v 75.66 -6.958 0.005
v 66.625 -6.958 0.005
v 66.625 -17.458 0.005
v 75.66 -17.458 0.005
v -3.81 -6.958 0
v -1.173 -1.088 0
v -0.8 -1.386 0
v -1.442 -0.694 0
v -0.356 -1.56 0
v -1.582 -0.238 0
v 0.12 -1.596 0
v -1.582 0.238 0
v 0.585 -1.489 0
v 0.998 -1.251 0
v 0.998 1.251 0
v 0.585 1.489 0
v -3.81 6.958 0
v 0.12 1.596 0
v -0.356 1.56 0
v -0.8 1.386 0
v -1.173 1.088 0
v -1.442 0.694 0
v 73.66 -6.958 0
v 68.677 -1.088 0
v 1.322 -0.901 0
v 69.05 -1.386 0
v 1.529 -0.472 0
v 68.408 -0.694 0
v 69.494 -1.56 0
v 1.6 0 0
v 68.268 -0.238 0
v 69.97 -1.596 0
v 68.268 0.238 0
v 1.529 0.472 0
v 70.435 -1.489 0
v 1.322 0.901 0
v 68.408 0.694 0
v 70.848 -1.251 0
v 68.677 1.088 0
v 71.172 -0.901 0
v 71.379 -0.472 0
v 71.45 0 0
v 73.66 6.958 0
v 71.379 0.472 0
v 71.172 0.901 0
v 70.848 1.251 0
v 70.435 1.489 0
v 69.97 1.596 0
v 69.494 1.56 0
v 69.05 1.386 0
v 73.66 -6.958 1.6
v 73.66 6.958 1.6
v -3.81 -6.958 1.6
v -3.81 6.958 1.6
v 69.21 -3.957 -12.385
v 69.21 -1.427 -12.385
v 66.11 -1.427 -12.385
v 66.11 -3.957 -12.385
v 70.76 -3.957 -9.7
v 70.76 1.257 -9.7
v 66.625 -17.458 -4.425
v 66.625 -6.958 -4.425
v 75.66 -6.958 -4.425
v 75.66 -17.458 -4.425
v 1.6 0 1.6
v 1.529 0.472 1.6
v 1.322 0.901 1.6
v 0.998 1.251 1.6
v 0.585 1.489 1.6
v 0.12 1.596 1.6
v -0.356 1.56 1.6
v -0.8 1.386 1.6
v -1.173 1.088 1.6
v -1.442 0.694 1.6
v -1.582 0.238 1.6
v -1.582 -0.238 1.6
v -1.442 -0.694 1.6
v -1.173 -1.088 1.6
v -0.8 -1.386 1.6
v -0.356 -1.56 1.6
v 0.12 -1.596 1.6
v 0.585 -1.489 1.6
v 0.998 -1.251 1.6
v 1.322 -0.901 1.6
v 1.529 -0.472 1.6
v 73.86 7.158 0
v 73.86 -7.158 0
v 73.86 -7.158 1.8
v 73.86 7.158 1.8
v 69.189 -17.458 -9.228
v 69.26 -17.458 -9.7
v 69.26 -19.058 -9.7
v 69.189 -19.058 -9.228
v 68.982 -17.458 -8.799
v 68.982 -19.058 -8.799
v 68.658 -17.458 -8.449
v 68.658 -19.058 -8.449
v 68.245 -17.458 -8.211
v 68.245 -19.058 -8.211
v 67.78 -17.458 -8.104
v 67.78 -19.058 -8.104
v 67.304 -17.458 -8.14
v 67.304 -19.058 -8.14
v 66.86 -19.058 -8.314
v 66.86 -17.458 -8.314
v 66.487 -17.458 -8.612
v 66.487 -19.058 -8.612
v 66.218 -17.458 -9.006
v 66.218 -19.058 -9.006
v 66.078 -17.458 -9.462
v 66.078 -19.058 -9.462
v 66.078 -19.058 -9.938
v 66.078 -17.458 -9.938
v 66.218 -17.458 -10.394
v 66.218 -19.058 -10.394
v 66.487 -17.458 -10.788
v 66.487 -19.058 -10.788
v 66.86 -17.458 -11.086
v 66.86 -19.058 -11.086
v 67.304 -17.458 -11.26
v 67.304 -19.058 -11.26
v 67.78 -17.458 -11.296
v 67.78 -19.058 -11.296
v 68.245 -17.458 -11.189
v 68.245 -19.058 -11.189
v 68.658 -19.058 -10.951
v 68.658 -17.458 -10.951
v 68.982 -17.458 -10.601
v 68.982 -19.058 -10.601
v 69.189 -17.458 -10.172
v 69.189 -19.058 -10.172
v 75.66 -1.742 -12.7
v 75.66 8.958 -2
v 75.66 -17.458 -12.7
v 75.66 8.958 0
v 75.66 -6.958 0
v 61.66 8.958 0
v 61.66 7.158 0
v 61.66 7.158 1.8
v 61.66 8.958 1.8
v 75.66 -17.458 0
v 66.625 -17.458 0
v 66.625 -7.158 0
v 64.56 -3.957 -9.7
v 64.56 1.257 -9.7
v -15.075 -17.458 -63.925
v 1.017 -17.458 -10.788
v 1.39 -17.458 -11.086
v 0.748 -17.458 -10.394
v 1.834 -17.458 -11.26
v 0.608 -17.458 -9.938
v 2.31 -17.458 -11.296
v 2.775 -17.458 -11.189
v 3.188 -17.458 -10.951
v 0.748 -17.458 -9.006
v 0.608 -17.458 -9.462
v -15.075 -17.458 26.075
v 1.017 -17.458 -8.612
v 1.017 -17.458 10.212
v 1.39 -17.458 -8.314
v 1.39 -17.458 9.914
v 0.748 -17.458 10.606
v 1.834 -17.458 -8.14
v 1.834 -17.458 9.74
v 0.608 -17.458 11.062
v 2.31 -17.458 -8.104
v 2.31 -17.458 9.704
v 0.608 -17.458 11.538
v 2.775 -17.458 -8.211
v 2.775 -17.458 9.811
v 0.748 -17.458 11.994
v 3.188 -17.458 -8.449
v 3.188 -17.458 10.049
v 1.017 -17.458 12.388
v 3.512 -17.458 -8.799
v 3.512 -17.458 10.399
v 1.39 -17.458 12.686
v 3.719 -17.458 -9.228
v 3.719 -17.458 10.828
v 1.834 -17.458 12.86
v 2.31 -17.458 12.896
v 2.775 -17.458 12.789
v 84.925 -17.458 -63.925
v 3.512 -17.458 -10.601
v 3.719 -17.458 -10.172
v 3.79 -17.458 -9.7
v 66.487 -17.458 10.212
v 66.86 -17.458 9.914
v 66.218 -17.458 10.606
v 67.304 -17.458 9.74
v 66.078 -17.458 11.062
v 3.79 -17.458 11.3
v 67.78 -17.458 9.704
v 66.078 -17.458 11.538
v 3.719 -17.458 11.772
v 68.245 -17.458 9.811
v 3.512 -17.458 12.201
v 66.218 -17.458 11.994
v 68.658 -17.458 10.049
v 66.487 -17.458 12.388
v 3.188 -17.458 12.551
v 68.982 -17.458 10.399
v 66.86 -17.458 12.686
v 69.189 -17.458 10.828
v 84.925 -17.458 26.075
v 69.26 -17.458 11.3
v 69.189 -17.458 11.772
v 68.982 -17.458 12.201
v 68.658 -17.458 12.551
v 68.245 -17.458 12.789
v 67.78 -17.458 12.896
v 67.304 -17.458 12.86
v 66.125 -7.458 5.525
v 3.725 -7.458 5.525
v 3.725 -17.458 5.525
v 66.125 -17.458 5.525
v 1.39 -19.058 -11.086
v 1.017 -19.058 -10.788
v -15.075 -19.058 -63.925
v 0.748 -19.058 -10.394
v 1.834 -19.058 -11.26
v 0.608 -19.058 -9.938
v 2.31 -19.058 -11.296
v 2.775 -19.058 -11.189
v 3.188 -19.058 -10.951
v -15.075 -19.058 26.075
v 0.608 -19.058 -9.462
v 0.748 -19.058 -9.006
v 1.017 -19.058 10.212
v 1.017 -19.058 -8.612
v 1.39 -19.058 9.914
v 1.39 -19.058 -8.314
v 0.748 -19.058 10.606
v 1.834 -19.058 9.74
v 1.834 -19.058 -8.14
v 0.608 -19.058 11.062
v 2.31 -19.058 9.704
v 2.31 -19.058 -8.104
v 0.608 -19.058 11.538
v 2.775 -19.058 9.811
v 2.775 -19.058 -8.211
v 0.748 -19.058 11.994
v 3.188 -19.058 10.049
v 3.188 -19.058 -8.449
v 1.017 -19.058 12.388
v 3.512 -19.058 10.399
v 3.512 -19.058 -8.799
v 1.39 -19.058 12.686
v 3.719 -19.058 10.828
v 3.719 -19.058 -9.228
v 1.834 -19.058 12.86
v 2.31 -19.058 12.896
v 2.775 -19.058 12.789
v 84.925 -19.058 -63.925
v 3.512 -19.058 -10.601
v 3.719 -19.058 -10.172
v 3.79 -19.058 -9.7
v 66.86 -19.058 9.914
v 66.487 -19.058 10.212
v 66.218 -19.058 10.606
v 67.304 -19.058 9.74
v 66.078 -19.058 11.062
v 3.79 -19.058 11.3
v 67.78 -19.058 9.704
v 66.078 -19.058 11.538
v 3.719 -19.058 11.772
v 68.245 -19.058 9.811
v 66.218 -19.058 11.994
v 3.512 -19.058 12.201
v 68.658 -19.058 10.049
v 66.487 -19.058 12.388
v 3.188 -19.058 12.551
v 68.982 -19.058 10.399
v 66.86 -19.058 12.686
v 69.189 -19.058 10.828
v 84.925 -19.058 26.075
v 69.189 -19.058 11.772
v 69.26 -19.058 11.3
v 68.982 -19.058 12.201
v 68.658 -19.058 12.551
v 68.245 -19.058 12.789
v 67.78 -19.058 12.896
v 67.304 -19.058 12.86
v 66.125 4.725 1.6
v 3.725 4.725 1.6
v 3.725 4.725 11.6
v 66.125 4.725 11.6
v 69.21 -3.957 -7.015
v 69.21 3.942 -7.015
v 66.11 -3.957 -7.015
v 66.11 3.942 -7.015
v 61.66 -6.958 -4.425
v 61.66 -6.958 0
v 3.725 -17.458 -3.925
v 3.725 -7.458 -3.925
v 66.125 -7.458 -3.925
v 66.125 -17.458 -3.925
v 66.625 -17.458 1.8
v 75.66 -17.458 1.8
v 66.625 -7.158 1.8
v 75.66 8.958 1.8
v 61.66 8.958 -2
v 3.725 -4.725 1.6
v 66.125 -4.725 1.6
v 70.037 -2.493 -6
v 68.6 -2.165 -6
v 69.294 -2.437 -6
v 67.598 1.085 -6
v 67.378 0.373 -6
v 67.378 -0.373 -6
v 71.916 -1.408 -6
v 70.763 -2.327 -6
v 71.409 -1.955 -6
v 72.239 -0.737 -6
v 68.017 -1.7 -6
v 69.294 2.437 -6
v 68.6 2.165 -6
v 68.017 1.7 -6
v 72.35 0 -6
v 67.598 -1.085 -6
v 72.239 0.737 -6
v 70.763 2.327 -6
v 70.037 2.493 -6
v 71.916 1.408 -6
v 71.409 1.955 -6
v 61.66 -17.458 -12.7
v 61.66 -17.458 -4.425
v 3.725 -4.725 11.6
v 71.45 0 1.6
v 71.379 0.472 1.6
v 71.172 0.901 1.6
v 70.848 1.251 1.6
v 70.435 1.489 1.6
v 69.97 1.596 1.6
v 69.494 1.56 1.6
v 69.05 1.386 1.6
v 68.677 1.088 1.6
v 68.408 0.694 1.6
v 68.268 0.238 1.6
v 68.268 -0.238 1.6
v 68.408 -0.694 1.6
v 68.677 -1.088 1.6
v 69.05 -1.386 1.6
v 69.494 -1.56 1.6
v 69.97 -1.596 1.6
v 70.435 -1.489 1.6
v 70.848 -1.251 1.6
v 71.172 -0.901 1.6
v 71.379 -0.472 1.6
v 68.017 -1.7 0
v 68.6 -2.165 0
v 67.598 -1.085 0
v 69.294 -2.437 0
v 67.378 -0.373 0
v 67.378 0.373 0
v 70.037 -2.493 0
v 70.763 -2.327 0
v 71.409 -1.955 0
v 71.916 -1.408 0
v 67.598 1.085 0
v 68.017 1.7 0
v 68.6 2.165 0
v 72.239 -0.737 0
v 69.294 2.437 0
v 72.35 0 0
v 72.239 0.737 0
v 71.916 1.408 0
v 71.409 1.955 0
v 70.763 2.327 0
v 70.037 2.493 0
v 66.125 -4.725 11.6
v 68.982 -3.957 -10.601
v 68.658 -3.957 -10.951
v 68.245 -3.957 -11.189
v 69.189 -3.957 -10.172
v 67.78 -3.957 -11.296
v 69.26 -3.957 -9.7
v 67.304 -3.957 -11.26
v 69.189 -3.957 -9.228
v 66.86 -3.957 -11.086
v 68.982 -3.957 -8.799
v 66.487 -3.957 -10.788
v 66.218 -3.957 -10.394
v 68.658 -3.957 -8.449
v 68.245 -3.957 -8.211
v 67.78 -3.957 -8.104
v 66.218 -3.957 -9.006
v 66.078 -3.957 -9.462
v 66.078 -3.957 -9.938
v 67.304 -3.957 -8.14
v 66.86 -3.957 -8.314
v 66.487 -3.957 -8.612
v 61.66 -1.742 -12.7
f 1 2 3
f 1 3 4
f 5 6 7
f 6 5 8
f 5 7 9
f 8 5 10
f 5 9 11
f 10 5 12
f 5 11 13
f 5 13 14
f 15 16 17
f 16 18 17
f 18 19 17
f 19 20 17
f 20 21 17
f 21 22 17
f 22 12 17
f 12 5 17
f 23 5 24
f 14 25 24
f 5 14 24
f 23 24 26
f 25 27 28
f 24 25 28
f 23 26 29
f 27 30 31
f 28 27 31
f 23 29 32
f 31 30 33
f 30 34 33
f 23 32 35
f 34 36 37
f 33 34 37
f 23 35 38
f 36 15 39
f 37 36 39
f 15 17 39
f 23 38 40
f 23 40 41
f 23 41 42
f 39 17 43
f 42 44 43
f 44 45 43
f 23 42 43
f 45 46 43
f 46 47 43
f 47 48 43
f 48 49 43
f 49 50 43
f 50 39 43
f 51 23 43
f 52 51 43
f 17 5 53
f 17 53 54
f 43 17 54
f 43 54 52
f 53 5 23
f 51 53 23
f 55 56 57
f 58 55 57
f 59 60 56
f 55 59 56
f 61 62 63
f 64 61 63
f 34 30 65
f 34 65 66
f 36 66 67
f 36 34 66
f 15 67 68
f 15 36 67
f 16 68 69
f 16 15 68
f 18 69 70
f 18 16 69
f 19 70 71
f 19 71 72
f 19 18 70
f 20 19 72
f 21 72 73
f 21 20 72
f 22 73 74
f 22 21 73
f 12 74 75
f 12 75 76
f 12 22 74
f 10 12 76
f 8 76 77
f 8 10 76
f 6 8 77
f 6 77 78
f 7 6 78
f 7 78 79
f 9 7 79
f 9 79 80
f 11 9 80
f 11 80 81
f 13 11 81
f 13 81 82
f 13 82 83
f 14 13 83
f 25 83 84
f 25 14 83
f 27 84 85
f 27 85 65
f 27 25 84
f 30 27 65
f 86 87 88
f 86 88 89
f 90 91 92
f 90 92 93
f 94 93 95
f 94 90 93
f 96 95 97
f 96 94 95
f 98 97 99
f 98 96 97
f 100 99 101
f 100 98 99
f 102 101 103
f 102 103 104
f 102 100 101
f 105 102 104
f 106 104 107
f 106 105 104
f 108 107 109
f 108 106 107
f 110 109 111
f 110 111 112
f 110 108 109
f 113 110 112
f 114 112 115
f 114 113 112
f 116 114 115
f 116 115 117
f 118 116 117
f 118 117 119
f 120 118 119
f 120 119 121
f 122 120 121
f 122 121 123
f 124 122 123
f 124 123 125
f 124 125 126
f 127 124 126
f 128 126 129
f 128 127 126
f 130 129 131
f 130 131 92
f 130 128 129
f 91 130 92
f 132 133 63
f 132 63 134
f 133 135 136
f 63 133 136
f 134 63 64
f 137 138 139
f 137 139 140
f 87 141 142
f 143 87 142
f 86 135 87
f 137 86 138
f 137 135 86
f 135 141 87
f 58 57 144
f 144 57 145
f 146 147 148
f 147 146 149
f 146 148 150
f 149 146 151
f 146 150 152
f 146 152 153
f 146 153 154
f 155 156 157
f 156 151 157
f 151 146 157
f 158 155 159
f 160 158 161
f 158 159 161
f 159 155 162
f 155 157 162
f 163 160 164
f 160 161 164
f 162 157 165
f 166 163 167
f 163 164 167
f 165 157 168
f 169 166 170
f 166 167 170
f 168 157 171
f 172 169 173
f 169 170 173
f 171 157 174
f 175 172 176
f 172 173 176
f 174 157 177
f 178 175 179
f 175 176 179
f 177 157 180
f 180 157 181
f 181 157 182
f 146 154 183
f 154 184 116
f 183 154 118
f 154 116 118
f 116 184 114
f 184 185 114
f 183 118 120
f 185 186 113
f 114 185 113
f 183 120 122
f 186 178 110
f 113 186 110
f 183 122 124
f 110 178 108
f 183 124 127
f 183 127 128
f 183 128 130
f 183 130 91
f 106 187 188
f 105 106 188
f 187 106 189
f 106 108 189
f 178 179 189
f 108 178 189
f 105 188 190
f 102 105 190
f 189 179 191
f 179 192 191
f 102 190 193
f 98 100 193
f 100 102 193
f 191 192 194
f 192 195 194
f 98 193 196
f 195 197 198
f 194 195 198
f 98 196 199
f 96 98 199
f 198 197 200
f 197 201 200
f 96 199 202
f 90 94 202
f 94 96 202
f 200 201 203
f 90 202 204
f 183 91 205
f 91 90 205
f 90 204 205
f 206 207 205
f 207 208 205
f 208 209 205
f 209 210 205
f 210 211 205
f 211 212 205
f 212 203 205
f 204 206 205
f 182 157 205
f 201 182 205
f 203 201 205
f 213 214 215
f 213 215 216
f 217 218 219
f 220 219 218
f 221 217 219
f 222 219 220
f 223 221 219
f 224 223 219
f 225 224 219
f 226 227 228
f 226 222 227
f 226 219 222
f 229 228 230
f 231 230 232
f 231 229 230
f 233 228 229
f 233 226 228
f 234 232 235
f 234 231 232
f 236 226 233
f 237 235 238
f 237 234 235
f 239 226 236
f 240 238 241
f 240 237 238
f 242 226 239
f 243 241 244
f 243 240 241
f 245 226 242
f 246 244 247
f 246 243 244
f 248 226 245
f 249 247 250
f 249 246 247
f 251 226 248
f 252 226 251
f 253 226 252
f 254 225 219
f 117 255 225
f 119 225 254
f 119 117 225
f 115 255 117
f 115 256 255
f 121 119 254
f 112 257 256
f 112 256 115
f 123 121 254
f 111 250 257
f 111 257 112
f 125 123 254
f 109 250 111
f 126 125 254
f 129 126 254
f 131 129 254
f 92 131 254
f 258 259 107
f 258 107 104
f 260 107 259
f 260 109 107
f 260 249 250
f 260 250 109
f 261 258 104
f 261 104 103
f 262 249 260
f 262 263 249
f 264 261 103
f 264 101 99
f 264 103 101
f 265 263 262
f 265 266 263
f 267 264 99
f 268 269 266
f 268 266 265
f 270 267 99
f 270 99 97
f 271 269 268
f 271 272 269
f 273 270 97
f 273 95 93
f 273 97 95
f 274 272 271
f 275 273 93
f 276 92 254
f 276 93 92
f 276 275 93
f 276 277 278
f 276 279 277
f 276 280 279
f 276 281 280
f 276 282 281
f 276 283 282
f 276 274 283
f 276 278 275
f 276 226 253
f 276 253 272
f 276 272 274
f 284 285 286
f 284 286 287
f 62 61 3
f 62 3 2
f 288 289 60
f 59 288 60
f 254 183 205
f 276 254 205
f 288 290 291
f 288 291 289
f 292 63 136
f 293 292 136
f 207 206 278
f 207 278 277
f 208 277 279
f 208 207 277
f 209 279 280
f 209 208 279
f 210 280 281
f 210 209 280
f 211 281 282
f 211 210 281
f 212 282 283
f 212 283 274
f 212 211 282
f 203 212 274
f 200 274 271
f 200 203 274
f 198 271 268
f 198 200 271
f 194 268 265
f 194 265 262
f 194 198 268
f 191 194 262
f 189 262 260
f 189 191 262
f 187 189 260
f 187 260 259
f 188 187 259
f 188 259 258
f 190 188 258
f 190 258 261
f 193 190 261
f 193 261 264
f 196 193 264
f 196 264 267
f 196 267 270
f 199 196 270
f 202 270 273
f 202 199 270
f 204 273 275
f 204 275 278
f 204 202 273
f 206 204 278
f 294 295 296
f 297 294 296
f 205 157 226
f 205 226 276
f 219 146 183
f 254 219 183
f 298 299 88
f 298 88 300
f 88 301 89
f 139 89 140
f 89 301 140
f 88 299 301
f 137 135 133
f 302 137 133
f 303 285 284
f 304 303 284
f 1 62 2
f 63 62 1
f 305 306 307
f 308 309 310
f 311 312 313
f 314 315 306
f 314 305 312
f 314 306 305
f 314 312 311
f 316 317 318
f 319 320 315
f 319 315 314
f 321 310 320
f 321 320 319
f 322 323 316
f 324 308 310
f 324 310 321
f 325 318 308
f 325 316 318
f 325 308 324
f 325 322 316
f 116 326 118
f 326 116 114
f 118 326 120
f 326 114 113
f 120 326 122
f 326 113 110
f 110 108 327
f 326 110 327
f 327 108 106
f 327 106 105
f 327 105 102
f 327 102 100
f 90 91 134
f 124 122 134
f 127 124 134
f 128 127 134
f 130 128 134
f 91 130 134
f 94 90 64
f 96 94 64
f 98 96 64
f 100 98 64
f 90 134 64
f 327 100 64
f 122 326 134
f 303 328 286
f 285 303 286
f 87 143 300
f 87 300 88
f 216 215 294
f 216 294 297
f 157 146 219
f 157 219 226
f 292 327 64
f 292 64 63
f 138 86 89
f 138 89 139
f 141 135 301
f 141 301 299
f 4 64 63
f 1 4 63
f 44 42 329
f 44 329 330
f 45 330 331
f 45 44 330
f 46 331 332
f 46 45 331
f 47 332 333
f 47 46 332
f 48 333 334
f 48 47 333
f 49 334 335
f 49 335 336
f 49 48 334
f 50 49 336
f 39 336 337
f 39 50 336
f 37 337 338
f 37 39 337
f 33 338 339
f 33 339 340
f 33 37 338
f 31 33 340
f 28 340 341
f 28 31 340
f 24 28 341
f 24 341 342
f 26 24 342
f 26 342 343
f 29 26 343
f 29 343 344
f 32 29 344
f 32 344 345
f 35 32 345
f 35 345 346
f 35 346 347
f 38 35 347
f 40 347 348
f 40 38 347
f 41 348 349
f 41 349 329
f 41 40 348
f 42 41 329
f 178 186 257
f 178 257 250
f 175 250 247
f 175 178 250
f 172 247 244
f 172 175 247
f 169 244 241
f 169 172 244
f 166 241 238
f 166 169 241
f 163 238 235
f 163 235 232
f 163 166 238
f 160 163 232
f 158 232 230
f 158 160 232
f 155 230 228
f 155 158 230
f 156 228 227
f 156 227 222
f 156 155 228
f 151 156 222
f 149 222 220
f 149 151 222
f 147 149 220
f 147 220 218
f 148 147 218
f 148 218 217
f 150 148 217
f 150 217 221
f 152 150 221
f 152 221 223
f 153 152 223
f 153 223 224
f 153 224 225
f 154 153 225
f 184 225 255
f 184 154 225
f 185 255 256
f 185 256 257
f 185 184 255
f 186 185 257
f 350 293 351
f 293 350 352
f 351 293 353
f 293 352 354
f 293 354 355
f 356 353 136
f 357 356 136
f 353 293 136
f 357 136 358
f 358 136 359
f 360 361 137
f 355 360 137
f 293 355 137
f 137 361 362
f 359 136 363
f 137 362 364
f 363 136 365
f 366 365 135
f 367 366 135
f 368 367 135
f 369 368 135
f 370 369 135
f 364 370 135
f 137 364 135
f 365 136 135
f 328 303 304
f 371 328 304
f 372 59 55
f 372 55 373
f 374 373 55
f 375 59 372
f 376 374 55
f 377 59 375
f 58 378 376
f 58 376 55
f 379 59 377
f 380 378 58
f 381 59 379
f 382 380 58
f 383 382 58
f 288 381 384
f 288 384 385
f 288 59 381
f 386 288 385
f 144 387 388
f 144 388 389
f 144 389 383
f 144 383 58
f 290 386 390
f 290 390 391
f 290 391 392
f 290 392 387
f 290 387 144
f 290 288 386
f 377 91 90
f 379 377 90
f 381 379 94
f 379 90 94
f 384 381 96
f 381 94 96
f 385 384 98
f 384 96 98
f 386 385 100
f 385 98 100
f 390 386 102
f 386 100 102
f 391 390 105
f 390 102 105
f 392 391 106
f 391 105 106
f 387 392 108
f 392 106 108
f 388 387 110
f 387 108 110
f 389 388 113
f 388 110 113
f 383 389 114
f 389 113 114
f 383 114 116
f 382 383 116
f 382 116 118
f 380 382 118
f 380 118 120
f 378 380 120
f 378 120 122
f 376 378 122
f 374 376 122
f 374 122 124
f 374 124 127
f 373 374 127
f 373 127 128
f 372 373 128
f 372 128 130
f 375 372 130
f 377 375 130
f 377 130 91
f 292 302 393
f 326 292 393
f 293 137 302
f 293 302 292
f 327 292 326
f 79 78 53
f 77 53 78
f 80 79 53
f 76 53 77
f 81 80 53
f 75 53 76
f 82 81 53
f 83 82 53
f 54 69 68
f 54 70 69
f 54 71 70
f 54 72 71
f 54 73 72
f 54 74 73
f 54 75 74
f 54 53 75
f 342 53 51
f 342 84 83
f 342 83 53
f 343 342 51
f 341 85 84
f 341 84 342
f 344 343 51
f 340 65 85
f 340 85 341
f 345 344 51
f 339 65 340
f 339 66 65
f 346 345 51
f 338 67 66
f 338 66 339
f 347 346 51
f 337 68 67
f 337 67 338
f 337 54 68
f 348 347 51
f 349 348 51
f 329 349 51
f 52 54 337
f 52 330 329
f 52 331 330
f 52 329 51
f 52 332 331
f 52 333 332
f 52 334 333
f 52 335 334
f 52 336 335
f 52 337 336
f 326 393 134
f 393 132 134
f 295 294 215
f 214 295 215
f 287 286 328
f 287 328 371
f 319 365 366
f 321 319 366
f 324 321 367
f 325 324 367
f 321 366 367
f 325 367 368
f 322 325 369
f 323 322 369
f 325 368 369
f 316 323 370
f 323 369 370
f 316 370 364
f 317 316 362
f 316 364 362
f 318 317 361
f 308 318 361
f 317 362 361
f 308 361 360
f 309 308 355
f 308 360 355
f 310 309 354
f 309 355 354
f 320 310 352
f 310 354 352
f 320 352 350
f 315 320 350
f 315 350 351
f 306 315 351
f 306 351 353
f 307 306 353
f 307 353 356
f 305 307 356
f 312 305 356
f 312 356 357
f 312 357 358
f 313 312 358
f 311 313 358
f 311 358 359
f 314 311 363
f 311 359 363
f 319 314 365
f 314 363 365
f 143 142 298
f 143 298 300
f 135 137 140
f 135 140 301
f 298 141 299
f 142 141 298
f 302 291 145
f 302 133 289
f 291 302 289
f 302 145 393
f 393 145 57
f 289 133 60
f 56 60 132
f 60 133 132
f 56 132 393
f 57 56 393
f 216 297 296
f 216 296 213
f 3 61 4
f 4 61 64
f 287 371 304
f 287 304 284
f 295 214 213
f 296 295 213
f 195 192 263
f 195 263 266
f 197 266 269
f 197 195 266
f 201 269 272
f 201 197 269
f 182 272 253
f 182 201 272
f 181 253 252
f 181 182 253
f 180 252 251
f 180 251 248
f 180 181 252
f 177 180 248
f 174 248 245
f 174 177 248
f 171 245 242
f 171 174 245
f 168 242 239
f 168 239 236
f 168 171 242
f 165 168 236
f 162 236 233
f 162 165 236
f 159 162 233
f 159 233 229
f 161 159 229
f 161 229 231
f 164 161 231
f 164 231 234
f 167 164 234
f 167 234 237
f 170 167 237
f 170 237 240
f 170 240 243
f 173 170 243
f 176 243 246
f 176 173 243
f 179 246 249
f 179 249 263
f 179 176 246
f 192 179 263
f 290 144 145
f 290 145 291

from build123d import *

# Parameters (mm, degrees)
SKETCH_W              = 77.47
SKETCH_H              = 13.915
SKETCH_R              = 1.6
EXTRUDE_DEPTH         = 1.6
SKETCH001_W           = 62.4
SKETCH001_H           = 9.45
EXTRUDE001_DEPTH      = 10
SKETCH002_W           = 62.4
SKETCH002_H           = 9.45
EXTRUDE002_DEPTH      = 10
SKETCH003_W           = 100
SKETCH003_H           = 90
SKETCH003_R           = 1.6
EXTRUDE003_DEPTH      = 1.6
SKETCH005_W           = 9.035
SKETCH005_H           = 10.5
EXTRUDE005_DEPTH      = 4.43
EXTRUDE006_DEPTH      = 1.8
SKETCH008_R           = 1.6
EXTRUDE008_DEPTH      = 22
EXTRUDE009_DEPTH      = 8.5
SKETCH007_R           = 2.5
EXTRUDE007_DEPTH      = 6
EXTRUDE004_DEPTH      = 2
EXTRUDE004_DEPTH_BACK = 12


with BuildPart() as extrude_body:
    # Sketch → Extrude (new body)
    with BuildSketch(Plane.XY):
        with Locations((34.925, 0)):
            Rectangle(SKETCH_W, SKETCH_H)
        Circle(SKETCH_R, mode=Mode.SUBTRACT)
        with Locations((69.85, 0)):
            Circle(SKETCH_R, mode=Mode.SUBTRACT)
    extrude(amount=EXTRUDE_DEPTH)


with BuildPart() as extrude001:
    # Sketch001 (on Face8 of Extrude) → Extrude001 (new body)
    with BuildSketch(Plane.XY.offset(1.6)):
        with Locations((34.925, 0)):
            Rectangle(SKETCH001_W, SKETCH001_H)
    extrude(amount=EXTRUDE001_DEPTH)


with BuildPart() as extrude002:
    # Sketch002 (on Face2 of Extrude) → Extrude002 (new body)
    with BuildSketch(Plane.XZ.offset(7.4575)):
        with Locations((34.925, 0.8)):
            Rectangle(SKETCH002_W, SKETCH002_H)
    extrude(amount=EXTRUDE002_DEPTH)


with BuildPart() as extrude003:
    # Sketch003 (on Face6 of Extrude002) → Extrude003 (new body)
    with BuildSketch(Plane.XZ.offset(17.4575)):
        with Locations((34.925, -18.925)):
            Rectangle(SKETCH003_W, SKETCH003_H)
        with Locations((2.19, 11.3)):
            Circle(SKETCH003_R, mode=Mode.SUBTRACT)
        with Locations((2.19, -9.7)):
            Circle(SKETCH003_R, mode=Mode.SUBTRACT)
        with Locations((67.66, 11.3)):
            Circle(SKETCH003_R, mode=Mode.SUBTRACT)
        with Locations((67.66, -9.7)):
            Circle(SKETCH003_R, mode=Mode.SUBTRACT)
    extrude(amount=EXTRUDE003_DEPTH)


with BuildPart() as extrude005:
    # Sketch005 (on Face5 of Extrude004) → Extrude005 (new body)
    with BuildSketch(Plane.XY.offset(-4.425)):
        with Locations((71.1425, -12.2075)):
            Rectangle(SKETCH005_W, SKETCH005_H)
    extrude(amount=EXTRUDE005_DEPTH)


with BuildPart() as extrude006:
    # Sketch006 (on Face7 of Extrude004) → Extrude006 (new body)
    with BuildSketch(Plane.XY):
        Polygon((61.66, 8.9575), (75.66, 8.9575), (75.66, -17.4575), (66.625, -17.4575), (66.625, -7.1575), (73.86, -7.1575), (73.86, 7.1575), (61.66, 7.1575), align=None)
    extrude(amount=EXTRUDE006_DEPTH)


with BuildPart() as extrude008:
    # Sketch008 (on Face4 of Extrude004) → Extrude008 (new body)
    with BuildSketch(Plane.XZ.offset(17.4575)):
        with Locations((67.66, -9.7)):
            Circle(SKETCH008_R)
    extrude(amount=-EXTRUDE008_DEPTH)


with BuildPart() as extrude009:
    # Sketch009 (on Face2 of Extrude008) → Extrude009 (new body)
    with BuildSketch(Plane(origin=(0, 4.5425, 0), x_dir=(-1, 0, 0), z_dir=(0, 1, 0))):
        Polygon((-64.56, -9.7), (-66.11, -7.015321), (-69.21, -7.015321), (-70.76, -9.7), (-69.21, -12.384679), (-66.11, -12.384679), align=None)
    extrude(amount=-EXTRUDE009_DEPTH)


with BuildPart() as fusion:
    # Sketch007 (on Face7 of Extrude004) → Extrude007 (new body)
    with BuildSketch(Plane.XY):
        with Locations((69.85, 0)):
            Circle(SKETCH007_R)
    extrude(amount=-EXTRUDE007_DEPTH)

    # Fusion: union Extrude008, Extrude009
    add(extrude008.part)
    add(extrude009.part)


with BuildPart() as cut:
    # Sketch004 (on Face3 of Extrude) → Extrude004 (new body, two sides)
    with BuildSketch(Plane.YZ.offset(73.66)) as extrude004_sk:
        Polygon((8.9575, 0), (8.9575, -2), (-1.7425, -12.7), (-17.4575, -12.7), (-17.4575, -4.425), (-6.9575, -4.425), (-6.9575, 0), align=None)
    extrude(amount=EXTRUDE004_DEPTH)
    extrude(extrude004_sk.sketch, amount=-EXTRUDE004_DEPTH_BACK)

    # Cut: cut Fusion
    add(fusion.part, mode=Mode.SUBTRACT)


solid = Compound([extrude_body.part, extrude001.part, extrude002.part, extrude003.part, extrude005.part, extrude006.part, cut.part])
